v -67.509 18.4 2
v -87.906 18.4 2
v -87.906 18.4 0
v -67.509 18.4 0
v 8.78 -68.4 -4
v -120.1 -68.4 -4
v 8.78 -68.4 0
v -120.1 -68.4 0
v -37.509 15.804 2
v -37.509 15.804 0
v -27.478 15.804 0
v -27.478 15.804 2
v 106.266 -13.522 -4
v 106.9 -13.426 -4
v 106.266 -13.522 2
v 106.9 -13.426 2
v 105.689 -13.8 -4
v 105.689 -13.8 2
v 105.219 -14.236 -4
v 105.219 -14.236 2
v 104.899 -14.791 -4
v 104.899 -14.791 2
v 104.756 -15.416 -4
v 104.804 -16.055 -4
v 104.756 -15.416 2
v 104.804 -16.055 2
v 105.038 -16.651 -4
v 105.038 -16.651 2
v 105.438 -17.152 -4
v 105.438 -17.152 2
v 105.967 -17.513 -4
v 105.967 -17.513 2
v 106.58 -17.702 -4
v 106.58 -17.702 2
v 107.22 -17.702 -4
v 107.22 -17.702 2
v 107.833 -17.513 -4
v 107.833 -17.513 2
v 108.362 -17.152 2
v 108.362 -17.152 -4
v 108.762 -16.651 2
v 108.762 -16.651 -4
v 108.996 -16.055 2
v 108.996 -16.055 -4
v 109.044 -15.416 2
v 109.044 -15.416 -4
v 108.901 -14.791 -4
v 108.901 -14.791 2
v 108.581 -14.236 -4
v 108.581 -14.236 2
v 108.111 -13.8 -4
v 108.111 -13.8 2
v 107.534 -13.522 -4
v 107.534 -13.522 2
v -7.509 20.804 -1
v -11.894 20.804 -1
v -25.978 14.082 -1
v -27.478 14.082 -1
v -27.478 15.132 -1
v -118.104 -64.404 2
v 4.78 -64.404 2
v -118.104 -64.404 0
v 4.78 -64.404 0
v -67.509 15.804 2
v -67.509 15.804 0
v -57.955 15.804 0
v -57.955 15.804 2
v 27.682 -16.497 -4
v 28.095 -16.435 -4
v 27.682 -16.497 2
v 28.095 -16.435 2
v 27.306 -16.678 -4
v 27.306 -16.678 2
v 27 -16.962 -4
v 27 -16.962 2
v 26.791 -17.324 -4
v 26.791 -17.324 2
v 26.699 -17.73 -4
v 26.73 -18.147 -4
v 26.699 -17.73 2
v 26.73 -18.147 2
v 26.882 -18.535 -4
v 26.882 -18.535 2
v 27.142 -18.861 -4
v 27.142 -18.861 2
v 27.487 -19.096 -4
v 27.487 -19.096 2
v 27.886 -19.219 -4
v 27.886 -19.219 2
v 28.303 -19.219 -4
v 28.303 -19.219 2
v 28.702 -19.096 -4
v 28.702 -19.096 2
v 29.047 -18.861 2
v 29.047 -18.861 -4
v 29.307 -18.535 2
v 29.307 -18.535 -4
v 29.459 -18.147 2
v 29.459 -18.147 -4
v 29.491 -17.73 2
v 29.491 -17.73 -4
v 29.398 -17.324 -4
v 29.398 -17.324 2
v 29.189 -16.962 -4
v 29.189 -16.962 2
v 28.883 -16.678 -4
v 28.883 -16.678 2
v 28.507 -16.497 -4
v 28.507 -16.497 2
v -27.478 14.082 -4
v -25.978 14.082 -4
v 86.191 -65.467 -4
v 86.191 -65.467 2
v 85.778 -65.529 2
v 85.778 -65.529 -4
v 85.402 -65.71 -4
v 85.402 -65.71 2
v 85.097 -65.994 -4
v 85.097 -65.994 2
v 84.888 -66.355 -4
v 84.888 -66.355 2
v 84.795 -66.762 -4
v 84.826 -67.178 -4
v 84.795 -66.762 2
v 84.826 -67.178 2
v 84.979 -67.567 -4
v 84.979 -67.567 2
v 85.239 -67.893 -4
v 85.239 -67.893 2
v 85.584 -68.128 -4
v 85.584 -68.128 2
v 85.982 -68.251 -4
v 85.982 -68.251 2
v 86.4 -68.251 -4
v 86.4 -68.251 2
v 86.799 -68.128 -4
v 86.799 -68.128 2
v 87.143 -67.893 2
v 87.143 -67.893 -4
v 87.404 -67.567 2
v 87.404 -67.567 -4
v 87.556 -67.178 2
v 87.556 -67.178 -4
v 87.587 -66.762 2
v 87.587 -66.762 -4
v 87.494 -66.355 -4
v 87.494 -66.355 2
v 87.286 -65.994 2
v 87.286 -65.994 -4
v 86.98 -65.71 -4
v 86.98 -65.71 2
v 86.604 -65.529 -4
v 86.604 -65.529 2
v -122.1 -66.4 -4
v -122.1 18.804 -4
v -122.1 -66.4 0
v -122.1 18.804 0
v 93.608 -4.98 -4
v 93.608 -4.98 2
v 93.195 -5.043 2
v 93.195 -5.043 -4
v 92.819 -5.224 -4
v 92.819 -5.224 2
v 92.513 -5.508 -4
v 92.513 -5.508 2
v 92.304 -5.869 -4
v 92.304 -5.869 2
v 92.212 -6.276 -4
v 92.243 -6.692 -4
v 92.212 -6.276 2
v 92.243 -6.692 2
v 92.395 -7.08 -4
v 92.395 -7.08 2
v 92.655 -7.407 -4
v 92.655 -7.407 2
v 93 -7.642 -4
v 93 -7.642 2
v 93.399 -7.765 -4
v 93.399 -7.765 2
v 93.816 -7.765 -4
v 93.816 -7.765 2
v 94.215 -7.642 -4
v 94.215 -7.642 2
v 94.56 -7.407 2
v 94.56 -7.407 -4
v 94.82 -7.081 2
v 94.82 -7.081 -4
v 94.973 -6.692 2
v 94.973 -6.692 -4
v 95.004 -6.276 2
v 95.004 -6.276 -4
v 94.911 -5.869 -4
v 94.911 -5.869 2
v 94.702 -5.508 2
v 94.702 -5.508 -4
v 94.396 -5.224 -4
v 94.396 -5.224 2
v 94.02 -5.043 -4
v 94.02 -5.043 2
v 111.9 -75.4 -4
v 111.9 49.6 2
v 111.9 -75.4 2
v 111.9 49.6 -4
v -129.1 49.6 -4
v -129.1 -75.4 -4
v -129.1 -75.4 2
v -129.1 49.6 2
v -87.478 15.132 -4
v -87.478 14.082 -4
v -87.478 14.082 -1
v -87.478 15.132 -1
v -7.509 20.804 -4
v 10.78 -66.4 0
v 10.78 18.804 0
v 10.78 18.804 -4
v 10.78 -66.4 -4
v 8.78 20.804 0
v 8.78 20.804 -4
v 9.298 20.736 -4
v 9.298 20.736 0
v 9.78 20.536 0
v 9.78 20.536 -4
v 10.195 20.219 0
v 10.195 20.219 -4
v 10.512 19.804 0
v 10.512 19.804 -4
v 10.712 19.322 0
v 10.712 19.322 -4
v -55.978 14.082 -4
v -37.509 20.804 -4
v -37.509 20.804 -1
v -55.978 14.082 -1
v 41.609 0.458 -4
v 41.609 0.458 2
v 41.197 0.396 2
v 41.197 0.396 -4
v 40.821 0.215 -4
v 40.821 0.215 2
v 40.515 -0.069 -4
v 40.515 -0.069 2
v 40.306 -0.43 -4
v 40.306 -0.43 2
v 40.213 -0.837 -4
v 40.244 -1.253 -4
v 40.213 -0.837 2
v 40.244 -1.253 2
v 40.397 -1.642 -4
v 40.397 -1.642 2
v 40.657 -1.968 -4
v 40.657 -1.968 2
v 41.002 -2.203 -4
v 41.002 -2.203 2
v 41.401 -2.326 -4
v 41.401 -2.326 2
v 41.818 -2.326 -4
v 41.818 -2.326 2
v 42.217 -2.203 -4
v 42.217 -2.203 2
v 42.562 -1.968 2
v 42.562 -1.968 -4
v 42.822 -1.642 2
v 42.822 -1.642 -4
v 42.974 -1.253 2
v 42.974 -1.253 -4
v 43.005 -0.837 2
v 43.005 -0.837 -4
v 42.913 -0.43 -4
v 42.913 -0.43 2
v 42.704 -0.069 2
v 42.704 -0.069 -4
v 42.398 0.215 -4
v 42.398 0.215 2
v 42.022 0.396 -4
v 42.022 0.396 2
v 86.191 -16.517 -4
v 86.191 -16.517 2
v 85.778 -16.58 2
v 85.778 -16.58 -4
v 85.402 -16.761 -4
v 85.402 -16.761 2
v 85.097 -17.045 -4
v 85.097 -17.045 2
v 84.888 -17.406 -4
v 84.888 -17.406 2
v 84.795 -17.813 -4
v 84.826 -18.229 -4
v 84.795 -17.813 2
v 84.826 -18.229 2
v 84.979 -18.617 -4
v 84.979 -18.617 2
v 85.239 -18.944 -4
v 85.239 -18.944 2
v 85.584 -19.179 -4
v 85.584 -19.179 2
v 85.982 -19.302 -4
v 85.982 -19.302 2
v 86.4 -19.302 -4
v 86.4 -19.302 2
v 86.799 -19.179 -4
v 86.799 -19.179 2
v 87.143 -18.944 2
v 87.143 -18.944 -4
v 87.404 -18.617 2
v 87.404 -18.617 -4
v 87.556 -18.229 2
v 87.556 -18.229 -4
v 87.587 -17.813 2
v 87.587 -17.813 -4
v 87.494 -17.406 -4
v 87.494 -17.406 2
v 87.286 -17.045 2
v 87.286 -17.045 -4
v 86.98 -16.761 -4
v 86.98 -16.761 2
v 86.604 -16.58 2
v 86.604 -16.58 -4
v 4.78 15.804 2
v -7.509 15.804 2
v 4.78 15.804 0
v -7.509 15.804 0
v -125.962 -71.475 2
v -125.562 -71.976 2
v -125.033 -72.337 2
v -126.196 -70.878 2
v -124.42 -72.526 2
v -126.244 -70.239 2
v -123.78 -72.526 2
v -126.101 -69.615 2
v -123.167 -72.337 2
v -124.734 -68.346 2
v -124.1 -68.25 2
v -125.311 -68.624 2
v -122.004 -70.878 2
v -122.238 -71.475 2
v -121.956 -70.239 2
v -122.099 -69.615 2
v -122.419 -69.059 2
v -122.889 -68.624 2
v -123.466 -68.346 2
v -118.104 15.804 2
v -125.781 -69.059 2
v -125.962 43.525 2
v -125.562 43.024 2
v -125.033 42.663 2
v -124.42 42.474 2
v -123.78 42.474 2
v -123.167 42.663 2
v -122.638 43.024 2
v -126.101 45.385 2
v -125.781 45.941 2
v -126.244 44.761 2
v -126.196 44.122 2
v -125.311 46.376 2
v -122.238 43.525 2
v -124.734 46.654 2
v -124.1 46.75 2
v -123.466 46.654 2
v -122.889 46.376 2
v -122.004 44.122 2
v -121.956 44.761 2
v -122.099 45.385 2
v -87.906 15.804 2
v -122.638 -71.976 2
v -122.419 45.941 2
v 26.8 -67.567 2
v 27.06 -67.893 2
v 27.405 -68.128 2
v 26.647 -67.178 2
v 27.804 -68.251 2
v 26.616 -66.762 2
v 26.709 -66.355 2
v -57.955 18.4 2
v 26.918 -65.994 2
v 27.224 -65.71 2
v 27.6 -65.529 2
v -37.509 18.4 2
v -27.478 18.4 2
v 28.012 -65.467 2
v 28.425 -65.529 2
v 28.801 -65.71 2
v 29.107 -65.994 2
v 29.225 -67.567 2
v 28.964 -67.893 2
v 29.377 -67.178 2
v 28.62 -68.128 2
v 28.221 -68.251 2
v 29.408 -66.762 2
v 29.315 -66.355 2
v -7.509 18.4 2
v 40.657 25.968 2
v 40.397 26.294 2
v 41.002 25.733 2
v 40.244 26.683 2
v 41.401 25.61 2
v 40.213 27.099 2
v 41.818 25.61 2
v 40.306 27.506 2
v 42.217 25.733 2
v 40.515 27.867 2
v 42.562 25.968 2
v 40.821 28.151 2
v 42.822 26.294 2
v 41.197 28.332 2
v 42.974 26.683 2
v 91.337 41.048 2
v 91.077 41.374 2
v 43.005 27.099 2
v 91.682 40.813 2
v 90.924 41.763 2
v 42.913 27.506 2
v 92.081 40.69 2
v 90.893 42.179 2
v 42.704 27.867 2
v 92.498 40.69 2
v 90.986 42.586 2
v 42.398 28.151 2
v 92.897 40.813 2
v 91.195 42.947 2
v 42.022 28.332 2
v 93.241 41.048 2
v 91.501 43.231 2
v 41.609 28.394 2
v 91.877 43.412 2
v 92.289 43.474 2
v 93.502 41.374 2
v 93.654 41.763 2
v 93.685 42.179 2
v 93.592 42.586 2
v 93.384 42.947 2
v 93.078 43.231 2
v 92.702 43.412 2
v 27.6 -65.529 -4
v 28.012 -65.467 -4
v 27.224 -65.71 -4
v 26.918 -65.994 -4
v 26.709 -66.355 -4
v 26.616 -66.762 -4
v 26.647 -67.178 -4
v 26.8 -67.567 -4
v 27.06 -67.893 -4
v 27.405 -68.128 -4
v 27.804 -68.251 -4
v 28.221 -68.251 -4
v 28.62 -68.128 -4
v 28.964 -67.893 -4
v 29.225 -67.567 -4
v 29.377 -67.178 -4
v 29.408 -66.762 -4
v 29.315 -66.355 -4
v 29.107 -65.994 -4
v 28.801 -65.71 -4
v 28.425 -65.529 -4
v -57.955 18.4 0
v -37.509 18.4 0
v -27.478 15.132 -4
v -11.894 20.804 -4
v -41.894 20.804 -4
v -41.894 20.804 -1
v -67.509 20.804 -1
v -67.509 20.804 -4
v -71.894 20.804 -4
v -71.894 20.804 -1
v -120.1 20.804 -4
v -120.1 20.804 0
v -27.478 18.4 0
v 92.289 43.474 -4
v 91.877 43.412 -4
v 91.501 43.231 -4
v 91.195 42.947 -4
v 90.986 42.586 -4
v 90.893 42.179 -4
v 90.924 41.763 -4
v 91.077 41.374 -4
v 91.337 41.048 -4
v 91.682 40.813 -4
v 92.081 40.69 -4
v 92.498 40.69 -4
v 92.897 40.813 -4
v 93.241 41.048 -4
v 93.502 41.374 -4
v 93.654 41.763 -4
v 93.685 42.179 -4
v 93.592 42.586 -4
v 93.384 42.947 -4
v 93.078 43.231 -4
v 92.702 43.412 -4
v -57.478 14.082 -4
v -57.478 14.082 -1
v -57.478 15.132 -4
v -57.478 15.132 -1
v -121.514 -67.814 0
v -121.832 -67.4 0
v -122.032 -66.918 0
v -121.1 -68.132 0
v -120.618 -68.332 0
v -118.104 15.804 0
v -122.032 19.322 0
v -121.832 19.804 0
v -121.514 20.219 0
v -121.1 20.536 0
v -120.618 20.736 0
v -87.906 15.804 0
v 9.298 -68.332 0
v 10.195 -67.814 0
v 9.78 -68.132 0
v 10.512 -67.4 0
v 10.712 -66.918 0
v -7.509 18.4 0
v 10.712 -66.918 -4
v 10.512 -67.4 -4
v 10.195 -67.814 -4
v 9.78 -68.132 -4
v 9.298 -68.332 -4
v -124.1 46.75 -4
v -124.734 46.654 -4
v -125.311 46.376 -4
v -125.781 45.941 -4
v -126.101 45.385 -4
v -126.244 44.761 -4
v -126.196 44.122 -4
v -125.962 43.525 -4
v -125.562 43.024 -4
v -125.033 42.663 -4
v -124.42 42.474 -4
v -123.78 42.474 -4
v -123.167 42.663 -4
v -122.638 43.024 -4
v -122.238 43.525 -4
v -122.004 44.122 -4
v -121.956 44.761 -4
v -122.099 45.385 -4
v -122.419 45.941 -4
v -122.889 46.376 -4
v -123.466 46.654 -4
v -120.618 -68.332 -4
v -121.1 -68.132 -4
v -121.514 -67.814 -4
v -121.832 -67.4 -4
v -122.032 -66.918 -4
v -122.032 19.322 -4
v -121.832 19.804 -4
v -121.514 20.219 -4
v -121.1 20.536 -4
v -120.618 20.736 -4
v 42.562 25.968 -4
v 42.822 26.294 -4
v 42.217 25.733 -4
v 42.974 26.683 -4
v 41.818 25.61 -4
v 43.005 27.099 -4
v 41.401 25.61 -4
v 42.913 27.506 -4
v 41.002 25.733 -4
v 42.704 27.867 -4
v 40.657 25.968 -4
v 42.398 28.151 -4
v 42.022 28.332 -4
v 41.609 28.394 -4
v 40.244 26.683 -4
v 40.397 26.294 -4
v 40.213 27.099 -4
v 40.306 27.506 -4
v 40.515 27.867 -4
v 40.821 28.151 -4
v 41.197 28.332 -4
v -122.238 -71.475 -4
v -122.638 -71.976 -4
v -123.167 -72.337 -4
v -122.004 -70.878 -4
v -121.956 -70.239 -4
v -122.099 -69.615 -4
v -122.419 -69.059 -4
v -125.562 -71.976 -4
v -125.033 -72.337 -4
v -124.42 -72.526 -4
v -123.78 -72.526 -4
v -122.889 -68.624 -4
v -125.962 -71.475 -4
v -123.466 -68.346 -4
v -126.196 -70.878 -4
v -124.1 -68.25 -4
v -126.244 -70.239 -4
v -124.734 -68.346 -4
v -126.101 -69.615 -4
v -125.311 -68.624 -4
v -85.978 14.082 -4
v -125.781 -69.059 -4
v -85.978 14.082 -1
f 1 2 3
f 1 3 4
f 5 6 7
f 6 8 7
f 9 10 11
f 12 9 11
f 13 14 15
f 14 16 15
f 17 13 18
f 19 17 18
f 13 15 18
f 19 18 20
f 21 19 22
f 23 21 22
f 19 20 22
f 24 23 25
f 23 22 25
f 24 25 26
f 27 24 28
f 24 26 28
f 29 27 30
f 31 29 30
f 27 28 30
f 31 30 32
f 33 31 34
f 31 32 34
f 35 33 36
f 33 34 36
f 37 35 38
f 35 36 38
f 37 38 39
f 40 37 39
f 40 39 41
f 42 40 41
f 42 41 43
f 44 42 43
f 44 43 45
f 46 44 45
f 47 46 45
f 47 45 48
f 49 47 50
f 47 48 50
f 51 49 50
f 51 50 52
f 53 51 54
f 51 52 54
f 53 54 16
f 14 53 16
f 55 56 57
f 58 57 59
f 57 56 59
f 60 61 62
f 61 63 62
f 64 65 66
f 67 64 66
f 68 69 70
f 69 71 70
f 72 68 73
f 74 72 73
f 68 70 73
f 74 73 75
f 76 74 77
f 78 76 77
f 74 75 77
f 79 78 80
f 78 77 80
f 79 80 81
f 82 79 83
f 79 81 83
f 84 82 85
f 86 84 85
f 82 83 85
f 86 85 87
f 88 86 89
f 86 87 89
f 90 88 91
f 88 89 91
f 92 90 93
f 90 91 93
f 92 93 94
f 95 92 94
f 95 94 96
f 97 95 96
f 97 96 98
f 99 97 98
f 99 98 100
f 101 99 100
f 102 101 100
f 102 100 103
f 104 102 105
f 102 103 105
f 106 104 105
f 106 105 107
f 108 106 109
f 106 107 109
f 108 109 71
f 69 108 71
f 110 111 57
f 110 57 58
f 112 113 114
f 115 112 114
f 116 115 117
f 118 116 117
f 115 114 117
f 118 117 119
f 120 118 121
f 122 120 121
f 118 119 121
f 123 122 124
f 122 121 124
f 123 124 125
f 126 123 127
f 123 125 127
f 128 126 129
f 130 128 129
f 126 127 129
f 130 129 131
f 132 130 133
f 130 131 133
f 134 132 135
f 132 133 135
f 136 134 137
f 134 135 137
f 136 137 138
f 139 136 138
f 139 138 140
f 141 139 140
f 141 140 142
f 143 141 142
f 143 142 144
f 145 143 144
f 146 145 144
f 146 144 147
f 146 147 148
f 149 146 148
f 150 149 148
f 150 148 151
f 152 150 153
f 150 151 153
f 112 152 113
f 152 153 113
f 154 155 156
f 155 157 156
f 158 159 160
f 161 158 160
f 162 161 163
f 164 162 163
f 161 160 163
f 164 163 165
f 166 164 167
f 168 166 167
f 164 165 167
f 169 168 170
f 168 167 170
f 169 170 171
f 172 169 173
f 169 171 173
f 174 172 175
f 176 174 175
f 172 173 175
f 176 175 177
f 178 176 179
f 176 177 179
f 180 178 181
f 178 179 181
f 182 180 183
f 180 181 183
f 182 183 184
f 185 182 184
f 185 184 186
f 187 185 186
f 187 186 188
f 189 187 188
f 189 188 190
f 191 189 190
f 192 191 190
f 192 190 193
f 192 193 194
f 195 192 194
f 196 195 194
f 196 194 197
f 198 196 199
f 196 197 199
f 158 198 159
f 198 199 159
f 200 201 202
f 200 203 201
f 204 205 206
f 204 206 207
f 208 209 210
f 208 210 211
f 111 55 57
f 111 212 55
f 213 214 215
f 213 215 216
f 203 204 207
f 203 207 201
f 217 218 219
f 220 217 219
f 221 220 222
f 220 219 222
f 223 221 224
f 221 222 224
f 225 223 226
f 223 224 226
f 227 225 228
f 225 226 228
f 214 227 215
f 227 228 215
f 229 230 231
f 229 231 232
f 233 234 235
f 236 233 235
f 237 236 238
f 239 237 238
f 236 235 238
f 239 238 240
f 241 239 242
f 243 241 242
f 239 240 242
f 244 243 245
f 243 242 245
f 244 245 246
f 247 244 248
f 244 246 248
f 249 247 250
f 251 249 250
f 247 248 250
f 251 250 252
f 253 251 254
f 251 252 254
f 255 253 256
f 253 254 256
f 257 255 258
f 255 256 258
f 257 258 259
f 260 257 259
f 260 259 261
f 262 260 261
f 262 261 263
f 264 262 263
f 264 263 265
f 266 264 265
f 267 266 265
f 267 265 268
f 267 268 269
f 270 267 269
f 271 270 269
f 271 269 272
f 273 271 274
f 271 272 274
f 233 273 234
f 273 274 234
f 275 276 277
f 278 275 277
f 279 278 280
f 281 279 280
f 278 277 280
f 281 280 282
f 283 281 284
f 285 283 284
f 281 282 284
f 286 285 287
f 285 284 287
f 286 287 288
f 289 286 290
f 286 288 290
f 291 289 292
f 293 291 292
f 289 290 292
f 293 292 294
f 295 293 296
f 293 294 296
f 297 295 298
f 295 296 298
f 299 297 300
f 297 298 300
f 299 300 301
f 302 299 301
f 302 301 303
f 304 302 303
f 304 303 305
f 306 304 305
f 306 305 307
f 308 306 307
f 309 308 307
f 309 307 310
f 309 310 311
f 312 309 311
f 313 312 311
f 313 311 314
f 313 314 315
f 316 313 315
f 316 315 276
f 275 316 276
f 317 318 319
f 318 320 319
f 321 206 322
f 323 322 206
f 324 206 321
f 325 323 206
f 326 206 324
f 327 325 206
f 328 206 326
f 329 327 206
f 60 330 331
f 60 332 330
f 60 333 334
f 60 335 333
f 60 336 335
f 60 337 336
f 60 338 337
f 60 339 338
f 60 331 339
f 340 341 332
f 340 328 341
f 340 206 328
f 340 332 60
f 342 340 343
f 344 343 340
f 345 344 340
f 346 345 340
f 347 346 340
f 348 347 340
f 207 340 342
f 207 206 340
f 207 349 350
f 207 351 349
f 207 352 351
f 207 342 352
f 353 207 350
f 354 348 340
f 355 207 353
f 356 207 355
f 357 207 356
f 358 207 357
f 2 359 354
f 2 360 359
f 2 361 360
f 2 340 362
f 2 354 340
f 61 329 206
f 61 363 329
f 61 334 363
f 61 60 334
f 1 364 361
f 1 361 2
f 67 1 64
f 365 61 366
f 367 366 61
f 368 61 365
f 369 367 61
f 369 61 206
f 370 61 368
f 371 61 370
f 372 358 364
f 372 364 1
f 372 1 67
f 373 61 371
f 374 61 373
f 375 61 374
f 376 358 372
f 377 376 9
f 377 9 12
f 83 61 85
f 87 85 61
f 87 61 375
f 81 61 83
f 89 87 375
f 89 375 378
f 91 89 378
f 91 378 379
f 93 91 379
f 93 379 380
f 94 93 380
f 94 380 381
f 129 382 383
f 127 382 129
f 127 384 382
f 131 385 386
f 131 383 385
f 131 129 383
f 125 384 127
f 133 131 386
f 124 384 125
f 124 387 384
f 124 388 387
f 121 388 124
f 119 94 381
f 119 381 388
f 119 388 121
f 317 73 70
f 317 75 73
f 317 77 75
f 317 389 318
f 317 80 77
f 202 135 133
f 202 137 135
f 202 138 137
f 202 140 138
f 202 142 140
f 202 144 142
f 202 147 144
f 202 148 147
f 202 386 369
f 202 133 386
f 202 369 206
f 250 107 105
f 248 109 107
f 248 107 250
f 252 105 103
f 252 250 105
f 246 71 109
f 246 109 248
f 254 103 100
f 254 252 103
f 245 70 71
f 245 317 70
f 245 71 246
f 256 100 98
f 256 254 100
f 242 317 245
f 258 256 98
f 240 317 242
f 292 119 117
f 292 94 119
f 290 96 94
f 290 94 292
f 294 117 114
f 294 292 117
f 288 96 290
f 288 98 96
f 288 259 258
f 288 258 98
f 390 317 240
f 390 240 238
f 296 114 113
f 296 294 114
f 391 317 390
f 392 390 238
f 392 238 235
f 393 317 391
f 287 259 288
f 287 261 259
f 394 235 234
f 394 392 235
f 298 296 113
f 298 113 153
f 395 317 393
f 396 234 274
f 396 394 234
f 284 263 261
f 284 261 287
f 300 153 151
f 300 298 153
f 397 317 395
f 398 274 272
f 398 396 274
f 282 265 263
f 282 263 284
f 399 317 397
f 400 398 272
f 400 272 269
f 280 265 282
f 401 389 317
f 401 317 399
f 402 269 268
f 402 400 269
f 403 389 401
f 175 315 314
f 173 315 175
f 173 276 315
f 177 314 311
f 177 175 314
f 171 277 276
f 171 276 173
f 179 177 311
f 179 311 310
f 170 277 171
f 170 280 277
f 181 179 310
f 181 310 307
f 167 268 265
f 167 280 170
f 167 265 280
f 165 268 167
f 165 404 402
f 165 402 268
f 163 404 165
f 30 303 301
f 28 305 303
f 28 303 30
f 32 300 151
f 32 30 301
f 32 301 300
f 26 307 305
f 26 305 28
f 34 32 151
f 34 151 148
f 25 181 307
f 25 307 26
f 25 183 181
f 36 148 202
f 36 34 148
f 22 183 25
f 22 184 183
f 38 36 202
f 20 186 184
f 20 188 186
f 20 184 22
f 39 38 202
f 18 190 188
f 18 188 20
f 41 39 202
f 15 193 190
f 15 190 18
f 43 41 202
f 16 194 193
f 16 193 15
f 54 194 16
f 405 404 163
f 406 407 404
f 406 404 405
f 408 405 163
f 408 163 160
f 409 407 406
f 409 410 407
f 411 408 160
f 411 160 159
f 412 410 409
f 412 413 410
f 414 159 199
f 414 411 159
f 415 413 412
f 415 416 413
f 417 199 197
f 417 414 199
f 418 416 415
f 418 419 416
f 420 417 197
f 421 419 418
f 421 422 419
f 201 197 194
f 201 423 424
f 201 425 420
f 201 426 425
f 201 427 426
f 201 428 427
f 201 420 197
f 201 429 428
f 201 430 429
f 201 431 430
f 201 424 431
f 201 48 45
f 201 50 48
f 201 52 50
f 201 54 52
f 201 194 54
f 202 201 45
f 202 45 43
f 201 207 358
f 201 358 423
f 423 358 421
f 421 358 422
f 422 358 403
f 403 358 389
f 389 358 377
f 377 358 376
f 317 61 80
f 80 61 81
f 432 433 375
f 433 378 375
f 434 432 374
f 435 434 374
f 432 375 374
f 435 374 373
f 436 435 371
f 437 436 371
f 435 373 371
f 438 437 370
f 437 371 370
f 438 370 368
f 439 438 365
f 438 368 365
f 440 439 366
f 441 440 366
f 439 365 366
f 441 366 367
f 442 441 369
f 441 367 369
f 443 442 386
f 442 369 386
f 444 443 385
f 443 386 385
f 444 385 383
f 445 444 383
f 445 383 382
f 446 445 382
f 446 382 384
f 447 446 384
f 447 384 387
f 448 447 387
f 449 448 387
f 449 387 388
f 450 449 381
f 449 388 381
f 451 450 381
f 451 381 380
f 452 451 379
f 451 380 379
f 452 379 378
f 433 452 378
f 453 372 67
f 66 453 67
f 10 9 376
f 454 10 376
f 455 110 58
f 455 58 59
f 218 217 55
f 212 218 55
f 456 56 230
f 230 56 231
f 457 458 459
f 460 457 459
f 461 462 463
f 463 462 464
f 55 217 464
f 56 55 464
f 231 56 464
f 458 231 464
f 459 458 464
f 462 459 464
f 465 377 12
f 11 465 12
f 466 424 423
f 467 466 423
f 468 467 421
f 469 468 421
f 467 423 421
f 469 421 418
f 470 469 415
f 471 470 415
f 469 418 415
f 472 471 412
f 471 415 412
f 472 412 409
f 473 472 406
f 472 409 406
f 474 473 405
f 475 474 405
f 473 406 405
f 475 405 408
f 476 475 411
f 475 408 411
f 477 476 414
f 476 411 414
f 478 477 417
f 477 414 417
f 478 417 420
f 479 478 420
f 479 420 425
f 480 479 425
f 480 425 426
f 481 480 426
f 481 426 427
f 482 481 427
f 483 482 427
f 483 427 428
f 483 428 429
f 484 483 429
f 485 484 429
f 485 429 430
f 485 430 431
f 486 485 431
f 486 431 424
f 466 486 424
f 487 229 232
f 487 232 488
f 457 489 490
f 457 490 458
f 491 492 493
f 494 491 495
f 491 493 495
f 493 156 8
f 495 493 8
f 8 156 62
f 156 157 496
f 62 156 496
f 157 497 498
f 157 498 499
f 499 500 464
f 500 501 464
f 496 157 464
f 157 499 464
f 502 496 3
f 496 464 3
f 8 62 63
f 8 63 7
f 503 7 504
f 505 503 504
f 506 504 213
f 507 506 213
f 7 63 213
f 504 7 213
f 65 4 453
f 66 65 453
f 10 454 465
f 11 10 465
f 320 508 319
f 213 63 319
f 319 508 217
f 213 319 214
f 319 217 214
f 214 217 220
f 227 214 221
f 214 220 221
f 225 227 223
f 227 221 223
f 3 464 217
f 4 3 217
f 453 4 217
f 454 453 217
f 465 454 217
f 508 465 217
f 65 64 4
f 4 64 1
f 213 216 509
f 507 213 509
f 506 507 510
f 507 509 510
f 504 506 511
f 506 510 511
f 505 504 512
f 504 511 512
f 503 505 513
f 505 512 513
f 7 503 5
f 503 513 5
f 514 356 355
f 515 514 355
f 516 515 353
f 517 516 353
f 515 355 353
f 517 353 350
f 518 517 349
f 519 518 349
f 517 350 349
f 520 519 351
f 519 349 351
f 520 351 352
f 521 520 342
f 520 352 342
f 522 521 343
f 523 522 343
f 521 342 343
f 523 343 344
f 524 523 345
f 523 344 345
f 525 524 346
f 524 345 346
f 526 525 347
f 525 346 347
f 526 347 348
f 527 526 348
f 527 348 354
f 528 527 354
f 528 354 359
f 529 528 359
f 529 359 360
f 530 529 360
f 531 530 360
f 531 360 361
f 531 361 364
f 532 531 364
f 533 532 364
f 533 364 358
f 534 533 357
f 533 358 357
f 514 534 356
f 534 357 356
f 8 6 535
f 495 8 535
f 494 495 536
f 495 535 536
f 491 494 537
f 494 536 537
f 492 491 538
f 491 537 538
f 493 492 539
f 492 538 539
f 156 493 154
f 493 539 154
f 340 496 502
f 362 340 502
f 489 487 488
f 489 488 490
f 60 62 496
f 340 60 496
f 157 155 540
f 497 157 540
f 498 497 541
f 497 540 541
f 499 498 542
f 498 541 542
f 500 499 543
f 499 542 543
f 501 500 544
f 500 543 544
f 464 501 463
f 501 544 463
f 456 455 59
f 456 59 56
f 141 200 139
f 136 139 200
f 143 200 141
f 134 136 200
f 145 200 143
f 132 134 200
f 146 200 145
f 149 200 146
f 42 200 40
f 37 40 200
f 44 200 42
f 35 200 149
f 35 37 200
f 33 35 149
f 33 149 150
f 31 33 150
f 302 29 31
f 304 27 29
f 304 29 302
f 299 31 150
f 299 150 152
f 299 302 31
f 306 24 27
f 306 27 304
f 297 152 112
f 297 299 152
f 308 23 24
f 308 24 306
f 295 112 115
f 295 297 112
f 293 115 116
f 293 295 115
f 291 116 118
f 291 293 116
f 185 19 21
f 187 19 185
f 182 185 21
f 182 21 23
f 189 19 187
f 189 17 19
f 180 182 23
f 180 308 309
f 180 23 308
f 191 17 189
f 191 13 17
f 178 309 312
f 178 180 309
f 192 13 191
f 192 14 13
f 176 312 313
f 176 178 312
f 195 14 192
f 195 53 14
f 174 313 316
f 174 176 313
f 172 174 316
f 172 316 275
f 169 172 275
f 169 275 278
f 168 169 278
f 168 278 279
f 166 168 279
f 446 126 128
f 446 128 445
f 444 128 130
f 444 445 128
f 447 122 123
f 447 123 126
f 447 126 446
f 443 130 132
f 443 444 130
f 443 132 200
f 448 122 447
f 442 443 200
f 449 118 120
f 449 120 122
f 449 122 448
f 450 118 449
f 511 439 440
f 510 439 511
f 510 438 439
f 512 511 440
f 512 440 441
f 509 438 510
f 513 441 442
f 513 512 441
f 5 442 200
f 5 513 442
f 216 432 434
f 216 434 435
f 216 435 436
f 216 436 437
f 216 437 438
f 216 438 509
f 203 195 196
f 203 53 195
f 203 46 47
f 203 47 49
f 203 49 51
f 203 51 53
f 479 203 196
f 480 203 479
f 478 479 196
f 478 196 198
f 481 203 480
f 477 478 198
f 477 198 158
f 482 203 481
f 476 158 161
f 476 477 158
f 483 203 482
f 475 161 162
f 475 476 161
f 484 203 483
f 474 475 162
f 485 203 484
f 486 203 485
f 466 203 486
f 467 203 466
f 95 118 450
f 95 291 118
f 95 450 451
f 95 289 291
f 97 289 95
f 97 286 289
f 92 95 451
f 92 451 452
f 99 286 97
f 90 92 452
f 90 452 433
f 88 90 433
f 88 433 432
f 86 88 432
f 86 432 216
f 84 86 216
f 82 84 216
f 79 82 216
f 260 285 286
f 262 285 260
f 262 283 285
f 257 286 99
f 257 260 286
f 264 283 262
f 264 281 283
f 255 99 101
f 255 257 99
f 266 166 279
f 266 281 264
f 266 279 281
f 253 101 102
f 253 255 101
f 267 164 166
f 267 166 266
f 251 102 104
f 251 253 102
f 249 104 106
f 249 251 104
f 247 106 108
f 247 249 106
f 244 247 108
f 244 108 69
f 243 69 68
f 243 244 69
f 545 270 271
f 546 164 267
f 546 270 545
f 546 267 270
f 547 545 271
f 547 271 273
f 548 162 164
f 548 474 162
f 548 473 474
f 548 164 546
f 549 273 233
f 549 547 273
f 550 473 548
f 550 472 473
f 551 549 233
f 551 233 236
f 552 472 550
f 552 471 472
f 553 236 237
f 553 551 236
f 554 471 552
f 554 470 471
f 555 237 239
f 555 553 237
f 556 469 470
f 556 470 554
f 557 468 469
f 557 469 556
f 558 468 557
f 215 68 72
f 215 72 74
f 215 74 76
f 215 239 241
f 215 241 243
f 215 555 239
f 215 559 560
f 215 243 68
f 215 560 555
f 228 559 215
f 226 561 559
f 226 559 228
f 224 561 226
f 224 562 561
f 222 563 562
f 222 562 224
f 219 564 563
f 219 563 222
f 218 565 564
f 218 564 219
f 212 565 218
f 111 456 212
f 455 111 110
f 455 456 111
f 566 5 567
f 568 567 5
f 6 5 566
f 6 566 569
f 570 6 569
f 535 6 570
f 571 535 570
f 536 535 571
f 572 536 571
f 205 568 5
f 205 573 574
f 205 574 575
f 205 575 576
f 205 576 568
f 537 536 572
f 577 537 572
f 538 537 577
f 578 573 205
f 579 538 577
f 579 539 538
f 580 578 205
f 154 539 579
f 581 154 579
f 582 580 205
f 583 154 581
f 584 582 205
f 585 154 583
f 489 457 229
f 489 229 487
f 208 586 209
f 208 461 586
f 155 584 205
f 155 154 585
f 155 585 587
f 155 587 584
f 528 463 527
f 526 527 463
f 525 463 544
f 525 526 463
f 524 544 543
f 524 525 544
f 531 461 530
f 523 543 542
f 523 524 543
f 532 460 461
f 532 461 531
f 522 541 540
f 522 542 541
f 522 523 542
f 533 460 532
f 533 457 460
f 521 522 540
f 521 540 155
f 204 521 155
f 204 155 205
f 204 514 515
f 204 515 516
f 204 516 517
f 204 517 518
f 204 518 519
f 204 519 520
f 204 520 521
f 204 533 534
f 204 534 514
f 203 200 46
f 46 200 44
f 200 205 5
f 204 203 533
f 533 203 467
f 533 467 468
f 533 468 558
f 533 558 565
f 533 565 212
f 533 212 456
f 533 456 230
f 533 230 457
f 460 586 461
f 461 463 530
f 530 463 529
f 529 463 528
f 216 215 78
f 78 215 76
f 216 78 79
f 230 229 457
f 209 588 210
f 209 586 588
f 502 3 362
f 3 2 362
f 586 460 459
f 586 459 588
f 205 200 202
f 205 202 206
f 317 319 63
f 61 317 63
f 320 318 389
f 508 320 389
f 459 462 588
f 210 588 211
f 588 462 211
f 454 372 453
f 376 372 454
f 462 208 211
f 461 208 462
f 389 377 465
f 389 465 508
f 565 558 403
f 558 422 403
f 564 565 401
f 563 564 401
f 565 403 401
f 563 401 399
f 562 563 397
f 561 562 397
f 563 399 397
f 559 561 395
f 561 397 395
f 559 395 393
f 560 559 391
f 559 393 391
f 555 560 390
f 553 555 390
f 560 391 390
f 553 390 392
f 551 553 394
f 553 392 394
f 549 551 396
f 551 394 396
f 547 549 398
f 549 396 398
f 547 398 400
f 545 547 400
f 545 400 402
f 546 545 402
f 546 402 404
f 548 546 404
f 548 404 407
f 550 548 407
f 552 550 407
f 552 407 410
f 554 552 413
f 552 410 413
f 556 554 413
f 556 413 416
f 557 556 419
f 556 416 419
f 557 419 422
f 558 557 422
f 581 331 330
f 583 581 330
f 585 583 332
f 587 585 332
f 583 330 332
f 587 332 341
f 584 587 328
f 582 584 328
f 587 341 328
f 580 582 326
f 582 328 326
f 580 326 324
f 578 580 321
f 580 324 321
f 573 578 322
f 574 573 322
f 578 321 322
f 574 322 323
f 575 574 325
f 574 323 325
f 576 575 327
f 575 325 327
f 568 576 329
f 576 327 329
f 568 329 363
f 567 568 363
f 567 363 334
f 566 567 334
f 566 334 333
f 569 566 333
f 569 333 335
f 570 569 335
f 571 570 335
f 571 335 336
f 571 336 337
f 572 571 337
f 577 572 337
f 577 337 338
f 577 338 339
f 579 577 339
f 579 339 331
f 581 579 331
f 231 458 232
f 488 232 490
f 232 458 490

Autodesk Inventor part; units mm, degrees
ref_plane "YZ Plane" through (0, 0, 0) normal (1, 0, 0) x (0, 1, 0)
ref_plane "XZ Plane" through (0, 0, 0) normal (0, 1, 0) x (-1, 0, 0)
ref_plane "XY Plane" through (0, 0, 0) normal (0, 0, 1) x (1, 0, 0)
sketch "Sketch1" plane through (0, 0, 0) normal (0, 0, 1) x (1, 0, 0)
  line L0 (-129.1, 49.6) -> (111.9, 49.6)
  line L1 (111.9, 49.6) -> (111.9, -75.4)
  line L2 (111.9, -75.4) -> (-129.1, -75.4)
  line L3 (-129.1, -75.4) -> (-129.1, 49.6)
  line L4 (-116.8, -67) -> (-68.1, -67)
  line L5 (-45.7, -67) -> (3, -67)
  line L6 (3, 18.4) -> (-45.7, 18.4)
  line L7 (-116.8, 18.5) -> (-68.1, 18.5)
  line L8 (-120.7, 14.5) -> (-120.7, -63.1)
  line L9 (-120.7, -67) -> (7.3759, -67) construction
  line L10 (7.3759, -67) -> (7.3759, 18.4) construction
  line L11 (7.3759, 18.4) -> (-120.7, 18.4) construction
  line L12 (-120.7, 18.4) -> (-120.7, -67) construction
  line L13 (4.7803, -64.4044) -> (-118.1044, -64.4044)
  line L14 (-118.1044, -64.4044) -> (-118.1044, 15.8044)
  line L15 (-118.1044, 15.8044) -> (4.7803, 15.8044)
  line L16 (4.7803, 15.8044) -> (4.7803, -64.4044)
  line L17 (-129.1, -55.4) -> (-129.1, -65.4)
  line L18 (-129.1, -75.4) -> (-119.1, -75.4) construction
  line L19 (111.9, -72.4764) -> (111.9, -32.5764) construction
  dimension "d78" = 0
extrude "Extrusion1" add sketch "Sketch1" along normal blind 2
sketch "Sketch10" plane through (0, 0, 0) normal (0, 0, -1) x (-1, 0, 0)
  line L0 (129.1, 49.6) -> (-111.9, 49.6) projected
  line L1 (-111.9, 49.6) -> (-111.9, -75.4) projected
  line L2 (-111.9, -75.4) -> (129.1, -75.4) projected
  line L3 (129.1, -75.4) -> (129.1, 49.6) projected
  line L4 (-104.9, -68.4) -> (-104.9, 42.6)
  line L5 (-104.9, 42.6) -> (122.1, 42.6)
  line L6 (122.1, 42.6) -> (122.1, -68.4)
  line L7 (122.1, -68.4) -> (-104.9, -68.4)
  line L8 (-3, 18.4) -> (45.7, 18.4)
  line L9 (-6.9, -63.1) -> (-6.9, 14.5)
  line L10 (122.1, 42.6) -> (-104.9, 42.6)
  line L11 (-104.9, 42.6) -> (-104.9, 20.8044)
  line L12 (-104.9, 20.8044) -> (122.1, 20.8044)
  line L13 (122.1, 20.8044) -> (122.1, 42.6)
  line L14 (-104.9, 20.8044) -> (-10.7803, 20.8044)
  line L15 (-10.7803, 20.8044) -> (-10.7803, -68.4)
  line L16 (-10.7803, -68.4) -> (-104.9, -68.4)
  line L17 (-104.9, -68.4) -> (-104.9, 20.8044)
  line L18 (-4.7803, 15.8044) -> (118.1044, 15.8044) projected
  line L19 (-104.9, 20.8044) -> (-12.287, 20.8044)
  line L20 (-12.287, 20.8044) -> (-12.287, -68.4)
  line L21 (-12.287, -68.4) -> (-104.9, -68.4)
  line L22 (-104.9, -68.4) -> (-104.9, 20.8044)
  line L23 (-4.7803, -64.4044) -> (-4.7803, 15.8044) projected
  point P0 (0, 0)
  dimension "d73" = 7
  dimension "d86" = 5
  dimension "d87" = 6
extrude "Extrusion7" add sketch "Sketch10" along normal blind 4 contours L3 L2 L1 L0 | L4 L12 L20 L7 | L4 L5 L6 L12 | L20 L12 L15 L7
sketch "Sketch11" plane through (0, 0, -4) normal (0, 0, -1) x (-1, 0, 0)
  circle A0 centre (124.1, -70.4) radius 1.9
  circle A1 centre (124.1, 44.6) radius 1.9
  circle A2 centre (-106.9, -15.5764) radius 3.5
  point P0 (-107.1551, -15.9364)
hole "Hole5" at (-124.1, 44.6, -4) at (-124.1, -70.4, -4) at (106.9, -15.5764, -4) direction (0, 0, 1) diameter 4.3 depth 8 tip angle 118
fillet "Fillet2" radius 2 4 edges at (10.7803, 20.8044, -2) (10.7803, -68.4, -2) (-122.1, 20.8044, -2) (-122.1, -68.4, -2)
sketch "Sketch12" plane through (0, 0, -4) normal (0, 0, -1) x (-1, 0, 0)
  circle A0 centre (124.1, -70.4) radius 2.15 projected
  circle A1 centre (124.1, 44.6) radius 2.15 projected
  circle A2 centre (-106.9, -15.5764) radius 2.15 projected
  line L0 (129.1, -75.4) -> (129.1, 49.6) projected
  line L1 (129.1, 49.6) -> (-111.9, 49.6) projected
  line L2 (-111.9, 49.6) -> (-111.9, -75.4) projected
  line L3 (-111.9, -75.4) -> (129.1, -75.4) projected
  arc A3 (-8.7803, 20.8044) -> (-10.7803, 18.8044) centre (-8.7803, 18.8044) ccw projected
  line L4 (120.1, 20.8044) -> (-8.7803, 20.8044) projected
  arc A4 (122.1, 18.8044) -> (120.1, 20.8044) centre (120.1, 18.8044) ccw projected
  line L5 (122.1, 18.8044) -> (122.1, -66.4) projected
  arc A5 (120.1, -68.4) -> (122.1, -66.4) centre (120.1, -66.4) ccw projected
  line L6 (120.1, -68.4) -> (-8.7803, -68.4) projected
  arc A6 (-10.7803, -66.4) -> (-8.7803, -68.4) centre (-8.7803, -66.4) ccw projected
  line L7 (-10.7803, 18.8044) -> (-10.7803, -66.4) projected
  line L8 (7.5087, 20.8044) -> (25.978, 14.0821)
  line L9 (25.978, 14.0821) -> (27.478, 14.0821)
  line L10 (27.478, 14.0821) -> (27.478, 15.1324)
  line L11 (27.478, 15.1324) -> (11.8945, 20.8044)
  line L12 (120.1, 20.8044) -> (-8.7803, 20.8044) projected
  line L13 (-10.7803, 18.8044) -> (-10.7803, -66.4) projected
  line L14 (120.1, 20.8044) -> (-8.7803, 20.8044) projected
  point P0 (0, 0)
  dimension "d89" = 1.5
  dimension "d90" = 1.5
  dimension "d91" = 160
extrude "Extrusion9" add sketch "Sketch12" against normal blind 3 contours L4 L11 L10 L9 L8
pattern_linear "Rectangular Pattern2" count 3 spacing 30 along (-1, 0, 0) of "Extrusion9"
sketch "Sketch13" plane through (0, 0, 2) normal (0, 0, 1) x (1, 0, 0)
  line L0 (-85.978, 14.0821) -> (-67.5087, 20.8044) projected
  line L1 (-71.8945, 20.8044) -> (-87.478, 15.1324) projected
  line L2 (-55.978, 14.0821) -> (-37.5087, 20.8044) projected
  line L3 (-41.8945, 20.8044) -> (-57.478, 15.1324) projected
  line L4 (-25.978, 14.0821) -> (-7.5087, 20.8044) projected
  line L5 (-11.8945, 20.8044) -> (-27.478, 15.1324) projected
  line L6 (-116.8, 18.4) -> (3, 18.4) projected
  line L7 (-87.9063, 8.4273) -> (-67.5087, 8.4273)
  line L8 (-67.5087, 8.4273) -> (-67.5087, 18.4)
  line L9 (-67.5087, 18.4) -> (-87.9063, 18.4)
  line L10 (-87.9063, 18.4) -> (-87.9063, 8.4273)
  line L11 (-57.955, 8.4273) -> (-37.5087, 8.4273)
  line L12 (-37.5087, 8.4273) -> (-37.5087, 18.4)
  line L13 (-37.5087, 18.4) -> (-57.955, 18.4)
  line L14 (-57.955, 18.4) -> (-57.955, 8.4273)
  line L15 (-27.478, 8.4273) -> (-7.5087, 8.4273)
  line L16 (-7.5087, 8.4273) -> (-7.5087, 18.4)
  line L17 (-7.5087, 18.4) -> (-27.478, 18.4)
  line L18 (-27.478, 18.4) -> (-27.478, 8.4273)
  point P0 (0, 0)
extrude "Extrusion10" cut sketch "Sketch13" against normal blind 3
sketch "Sketch14" plane through (0, 0, -4) normal (0, 0, -1) x (-1, 0, 0)
  circle A0 centre (-92.31, 42.06) radius 1.5875 projected
  circle A1 centre (-41.51, 26.82) radius 1.5875 projected
  circle A2 centre (-93.58, -6.2) radius 1.5875 projected
  circle A3 centre (-41.51, -1.12) radius 1.5875 projected
  circle A4 centre (-86.028, -17.9) radius 1.375 projected
  circle A5 centre (-28.028, -17.9) radius 1.375 projected
  circle A6 centre (-28.028, -66.9) radius 1.375 projected
  circle A7 centre (-86.028, -66.9) radius 1.375 projected
  point P0 (0, 0)
sketch "Sketch15" plane through (0, 0, -4) normal (0, 0, -1) x (-1, 0, 0)
  point P0 (0, 0)
  point P1 (-92.2892, 42.0744)
  point P2 (-41.6093, 26.9941)
  point P3 (-41.6093, -0.9417)
  point P4 (-28.0946, -17.835)
  point P5 (-28.0122, -66.8668)
  point P6 (-86.1911, -66.8668)
  point P7 (-86.1911, -17.9174)
  point P8 (-93.6077, -6.3805)
hole "Hole6" at (92.2892, 42.0744, -4) at (41.6093, 26.9941, -4) at (41.6093, -0.9417, -4) at (28.0946, -17.835, -4) at (28.0122, -66.8668, -4) at (86.1911, -66.8668, -4) at (86.1911, -17.9174, -4) at (93.6077, -6.3805, -4) direction (0, 0, 1) diameter 2.8 end through all
properties part number "04_OPENTRONS_Microscope_wellplate_base"
